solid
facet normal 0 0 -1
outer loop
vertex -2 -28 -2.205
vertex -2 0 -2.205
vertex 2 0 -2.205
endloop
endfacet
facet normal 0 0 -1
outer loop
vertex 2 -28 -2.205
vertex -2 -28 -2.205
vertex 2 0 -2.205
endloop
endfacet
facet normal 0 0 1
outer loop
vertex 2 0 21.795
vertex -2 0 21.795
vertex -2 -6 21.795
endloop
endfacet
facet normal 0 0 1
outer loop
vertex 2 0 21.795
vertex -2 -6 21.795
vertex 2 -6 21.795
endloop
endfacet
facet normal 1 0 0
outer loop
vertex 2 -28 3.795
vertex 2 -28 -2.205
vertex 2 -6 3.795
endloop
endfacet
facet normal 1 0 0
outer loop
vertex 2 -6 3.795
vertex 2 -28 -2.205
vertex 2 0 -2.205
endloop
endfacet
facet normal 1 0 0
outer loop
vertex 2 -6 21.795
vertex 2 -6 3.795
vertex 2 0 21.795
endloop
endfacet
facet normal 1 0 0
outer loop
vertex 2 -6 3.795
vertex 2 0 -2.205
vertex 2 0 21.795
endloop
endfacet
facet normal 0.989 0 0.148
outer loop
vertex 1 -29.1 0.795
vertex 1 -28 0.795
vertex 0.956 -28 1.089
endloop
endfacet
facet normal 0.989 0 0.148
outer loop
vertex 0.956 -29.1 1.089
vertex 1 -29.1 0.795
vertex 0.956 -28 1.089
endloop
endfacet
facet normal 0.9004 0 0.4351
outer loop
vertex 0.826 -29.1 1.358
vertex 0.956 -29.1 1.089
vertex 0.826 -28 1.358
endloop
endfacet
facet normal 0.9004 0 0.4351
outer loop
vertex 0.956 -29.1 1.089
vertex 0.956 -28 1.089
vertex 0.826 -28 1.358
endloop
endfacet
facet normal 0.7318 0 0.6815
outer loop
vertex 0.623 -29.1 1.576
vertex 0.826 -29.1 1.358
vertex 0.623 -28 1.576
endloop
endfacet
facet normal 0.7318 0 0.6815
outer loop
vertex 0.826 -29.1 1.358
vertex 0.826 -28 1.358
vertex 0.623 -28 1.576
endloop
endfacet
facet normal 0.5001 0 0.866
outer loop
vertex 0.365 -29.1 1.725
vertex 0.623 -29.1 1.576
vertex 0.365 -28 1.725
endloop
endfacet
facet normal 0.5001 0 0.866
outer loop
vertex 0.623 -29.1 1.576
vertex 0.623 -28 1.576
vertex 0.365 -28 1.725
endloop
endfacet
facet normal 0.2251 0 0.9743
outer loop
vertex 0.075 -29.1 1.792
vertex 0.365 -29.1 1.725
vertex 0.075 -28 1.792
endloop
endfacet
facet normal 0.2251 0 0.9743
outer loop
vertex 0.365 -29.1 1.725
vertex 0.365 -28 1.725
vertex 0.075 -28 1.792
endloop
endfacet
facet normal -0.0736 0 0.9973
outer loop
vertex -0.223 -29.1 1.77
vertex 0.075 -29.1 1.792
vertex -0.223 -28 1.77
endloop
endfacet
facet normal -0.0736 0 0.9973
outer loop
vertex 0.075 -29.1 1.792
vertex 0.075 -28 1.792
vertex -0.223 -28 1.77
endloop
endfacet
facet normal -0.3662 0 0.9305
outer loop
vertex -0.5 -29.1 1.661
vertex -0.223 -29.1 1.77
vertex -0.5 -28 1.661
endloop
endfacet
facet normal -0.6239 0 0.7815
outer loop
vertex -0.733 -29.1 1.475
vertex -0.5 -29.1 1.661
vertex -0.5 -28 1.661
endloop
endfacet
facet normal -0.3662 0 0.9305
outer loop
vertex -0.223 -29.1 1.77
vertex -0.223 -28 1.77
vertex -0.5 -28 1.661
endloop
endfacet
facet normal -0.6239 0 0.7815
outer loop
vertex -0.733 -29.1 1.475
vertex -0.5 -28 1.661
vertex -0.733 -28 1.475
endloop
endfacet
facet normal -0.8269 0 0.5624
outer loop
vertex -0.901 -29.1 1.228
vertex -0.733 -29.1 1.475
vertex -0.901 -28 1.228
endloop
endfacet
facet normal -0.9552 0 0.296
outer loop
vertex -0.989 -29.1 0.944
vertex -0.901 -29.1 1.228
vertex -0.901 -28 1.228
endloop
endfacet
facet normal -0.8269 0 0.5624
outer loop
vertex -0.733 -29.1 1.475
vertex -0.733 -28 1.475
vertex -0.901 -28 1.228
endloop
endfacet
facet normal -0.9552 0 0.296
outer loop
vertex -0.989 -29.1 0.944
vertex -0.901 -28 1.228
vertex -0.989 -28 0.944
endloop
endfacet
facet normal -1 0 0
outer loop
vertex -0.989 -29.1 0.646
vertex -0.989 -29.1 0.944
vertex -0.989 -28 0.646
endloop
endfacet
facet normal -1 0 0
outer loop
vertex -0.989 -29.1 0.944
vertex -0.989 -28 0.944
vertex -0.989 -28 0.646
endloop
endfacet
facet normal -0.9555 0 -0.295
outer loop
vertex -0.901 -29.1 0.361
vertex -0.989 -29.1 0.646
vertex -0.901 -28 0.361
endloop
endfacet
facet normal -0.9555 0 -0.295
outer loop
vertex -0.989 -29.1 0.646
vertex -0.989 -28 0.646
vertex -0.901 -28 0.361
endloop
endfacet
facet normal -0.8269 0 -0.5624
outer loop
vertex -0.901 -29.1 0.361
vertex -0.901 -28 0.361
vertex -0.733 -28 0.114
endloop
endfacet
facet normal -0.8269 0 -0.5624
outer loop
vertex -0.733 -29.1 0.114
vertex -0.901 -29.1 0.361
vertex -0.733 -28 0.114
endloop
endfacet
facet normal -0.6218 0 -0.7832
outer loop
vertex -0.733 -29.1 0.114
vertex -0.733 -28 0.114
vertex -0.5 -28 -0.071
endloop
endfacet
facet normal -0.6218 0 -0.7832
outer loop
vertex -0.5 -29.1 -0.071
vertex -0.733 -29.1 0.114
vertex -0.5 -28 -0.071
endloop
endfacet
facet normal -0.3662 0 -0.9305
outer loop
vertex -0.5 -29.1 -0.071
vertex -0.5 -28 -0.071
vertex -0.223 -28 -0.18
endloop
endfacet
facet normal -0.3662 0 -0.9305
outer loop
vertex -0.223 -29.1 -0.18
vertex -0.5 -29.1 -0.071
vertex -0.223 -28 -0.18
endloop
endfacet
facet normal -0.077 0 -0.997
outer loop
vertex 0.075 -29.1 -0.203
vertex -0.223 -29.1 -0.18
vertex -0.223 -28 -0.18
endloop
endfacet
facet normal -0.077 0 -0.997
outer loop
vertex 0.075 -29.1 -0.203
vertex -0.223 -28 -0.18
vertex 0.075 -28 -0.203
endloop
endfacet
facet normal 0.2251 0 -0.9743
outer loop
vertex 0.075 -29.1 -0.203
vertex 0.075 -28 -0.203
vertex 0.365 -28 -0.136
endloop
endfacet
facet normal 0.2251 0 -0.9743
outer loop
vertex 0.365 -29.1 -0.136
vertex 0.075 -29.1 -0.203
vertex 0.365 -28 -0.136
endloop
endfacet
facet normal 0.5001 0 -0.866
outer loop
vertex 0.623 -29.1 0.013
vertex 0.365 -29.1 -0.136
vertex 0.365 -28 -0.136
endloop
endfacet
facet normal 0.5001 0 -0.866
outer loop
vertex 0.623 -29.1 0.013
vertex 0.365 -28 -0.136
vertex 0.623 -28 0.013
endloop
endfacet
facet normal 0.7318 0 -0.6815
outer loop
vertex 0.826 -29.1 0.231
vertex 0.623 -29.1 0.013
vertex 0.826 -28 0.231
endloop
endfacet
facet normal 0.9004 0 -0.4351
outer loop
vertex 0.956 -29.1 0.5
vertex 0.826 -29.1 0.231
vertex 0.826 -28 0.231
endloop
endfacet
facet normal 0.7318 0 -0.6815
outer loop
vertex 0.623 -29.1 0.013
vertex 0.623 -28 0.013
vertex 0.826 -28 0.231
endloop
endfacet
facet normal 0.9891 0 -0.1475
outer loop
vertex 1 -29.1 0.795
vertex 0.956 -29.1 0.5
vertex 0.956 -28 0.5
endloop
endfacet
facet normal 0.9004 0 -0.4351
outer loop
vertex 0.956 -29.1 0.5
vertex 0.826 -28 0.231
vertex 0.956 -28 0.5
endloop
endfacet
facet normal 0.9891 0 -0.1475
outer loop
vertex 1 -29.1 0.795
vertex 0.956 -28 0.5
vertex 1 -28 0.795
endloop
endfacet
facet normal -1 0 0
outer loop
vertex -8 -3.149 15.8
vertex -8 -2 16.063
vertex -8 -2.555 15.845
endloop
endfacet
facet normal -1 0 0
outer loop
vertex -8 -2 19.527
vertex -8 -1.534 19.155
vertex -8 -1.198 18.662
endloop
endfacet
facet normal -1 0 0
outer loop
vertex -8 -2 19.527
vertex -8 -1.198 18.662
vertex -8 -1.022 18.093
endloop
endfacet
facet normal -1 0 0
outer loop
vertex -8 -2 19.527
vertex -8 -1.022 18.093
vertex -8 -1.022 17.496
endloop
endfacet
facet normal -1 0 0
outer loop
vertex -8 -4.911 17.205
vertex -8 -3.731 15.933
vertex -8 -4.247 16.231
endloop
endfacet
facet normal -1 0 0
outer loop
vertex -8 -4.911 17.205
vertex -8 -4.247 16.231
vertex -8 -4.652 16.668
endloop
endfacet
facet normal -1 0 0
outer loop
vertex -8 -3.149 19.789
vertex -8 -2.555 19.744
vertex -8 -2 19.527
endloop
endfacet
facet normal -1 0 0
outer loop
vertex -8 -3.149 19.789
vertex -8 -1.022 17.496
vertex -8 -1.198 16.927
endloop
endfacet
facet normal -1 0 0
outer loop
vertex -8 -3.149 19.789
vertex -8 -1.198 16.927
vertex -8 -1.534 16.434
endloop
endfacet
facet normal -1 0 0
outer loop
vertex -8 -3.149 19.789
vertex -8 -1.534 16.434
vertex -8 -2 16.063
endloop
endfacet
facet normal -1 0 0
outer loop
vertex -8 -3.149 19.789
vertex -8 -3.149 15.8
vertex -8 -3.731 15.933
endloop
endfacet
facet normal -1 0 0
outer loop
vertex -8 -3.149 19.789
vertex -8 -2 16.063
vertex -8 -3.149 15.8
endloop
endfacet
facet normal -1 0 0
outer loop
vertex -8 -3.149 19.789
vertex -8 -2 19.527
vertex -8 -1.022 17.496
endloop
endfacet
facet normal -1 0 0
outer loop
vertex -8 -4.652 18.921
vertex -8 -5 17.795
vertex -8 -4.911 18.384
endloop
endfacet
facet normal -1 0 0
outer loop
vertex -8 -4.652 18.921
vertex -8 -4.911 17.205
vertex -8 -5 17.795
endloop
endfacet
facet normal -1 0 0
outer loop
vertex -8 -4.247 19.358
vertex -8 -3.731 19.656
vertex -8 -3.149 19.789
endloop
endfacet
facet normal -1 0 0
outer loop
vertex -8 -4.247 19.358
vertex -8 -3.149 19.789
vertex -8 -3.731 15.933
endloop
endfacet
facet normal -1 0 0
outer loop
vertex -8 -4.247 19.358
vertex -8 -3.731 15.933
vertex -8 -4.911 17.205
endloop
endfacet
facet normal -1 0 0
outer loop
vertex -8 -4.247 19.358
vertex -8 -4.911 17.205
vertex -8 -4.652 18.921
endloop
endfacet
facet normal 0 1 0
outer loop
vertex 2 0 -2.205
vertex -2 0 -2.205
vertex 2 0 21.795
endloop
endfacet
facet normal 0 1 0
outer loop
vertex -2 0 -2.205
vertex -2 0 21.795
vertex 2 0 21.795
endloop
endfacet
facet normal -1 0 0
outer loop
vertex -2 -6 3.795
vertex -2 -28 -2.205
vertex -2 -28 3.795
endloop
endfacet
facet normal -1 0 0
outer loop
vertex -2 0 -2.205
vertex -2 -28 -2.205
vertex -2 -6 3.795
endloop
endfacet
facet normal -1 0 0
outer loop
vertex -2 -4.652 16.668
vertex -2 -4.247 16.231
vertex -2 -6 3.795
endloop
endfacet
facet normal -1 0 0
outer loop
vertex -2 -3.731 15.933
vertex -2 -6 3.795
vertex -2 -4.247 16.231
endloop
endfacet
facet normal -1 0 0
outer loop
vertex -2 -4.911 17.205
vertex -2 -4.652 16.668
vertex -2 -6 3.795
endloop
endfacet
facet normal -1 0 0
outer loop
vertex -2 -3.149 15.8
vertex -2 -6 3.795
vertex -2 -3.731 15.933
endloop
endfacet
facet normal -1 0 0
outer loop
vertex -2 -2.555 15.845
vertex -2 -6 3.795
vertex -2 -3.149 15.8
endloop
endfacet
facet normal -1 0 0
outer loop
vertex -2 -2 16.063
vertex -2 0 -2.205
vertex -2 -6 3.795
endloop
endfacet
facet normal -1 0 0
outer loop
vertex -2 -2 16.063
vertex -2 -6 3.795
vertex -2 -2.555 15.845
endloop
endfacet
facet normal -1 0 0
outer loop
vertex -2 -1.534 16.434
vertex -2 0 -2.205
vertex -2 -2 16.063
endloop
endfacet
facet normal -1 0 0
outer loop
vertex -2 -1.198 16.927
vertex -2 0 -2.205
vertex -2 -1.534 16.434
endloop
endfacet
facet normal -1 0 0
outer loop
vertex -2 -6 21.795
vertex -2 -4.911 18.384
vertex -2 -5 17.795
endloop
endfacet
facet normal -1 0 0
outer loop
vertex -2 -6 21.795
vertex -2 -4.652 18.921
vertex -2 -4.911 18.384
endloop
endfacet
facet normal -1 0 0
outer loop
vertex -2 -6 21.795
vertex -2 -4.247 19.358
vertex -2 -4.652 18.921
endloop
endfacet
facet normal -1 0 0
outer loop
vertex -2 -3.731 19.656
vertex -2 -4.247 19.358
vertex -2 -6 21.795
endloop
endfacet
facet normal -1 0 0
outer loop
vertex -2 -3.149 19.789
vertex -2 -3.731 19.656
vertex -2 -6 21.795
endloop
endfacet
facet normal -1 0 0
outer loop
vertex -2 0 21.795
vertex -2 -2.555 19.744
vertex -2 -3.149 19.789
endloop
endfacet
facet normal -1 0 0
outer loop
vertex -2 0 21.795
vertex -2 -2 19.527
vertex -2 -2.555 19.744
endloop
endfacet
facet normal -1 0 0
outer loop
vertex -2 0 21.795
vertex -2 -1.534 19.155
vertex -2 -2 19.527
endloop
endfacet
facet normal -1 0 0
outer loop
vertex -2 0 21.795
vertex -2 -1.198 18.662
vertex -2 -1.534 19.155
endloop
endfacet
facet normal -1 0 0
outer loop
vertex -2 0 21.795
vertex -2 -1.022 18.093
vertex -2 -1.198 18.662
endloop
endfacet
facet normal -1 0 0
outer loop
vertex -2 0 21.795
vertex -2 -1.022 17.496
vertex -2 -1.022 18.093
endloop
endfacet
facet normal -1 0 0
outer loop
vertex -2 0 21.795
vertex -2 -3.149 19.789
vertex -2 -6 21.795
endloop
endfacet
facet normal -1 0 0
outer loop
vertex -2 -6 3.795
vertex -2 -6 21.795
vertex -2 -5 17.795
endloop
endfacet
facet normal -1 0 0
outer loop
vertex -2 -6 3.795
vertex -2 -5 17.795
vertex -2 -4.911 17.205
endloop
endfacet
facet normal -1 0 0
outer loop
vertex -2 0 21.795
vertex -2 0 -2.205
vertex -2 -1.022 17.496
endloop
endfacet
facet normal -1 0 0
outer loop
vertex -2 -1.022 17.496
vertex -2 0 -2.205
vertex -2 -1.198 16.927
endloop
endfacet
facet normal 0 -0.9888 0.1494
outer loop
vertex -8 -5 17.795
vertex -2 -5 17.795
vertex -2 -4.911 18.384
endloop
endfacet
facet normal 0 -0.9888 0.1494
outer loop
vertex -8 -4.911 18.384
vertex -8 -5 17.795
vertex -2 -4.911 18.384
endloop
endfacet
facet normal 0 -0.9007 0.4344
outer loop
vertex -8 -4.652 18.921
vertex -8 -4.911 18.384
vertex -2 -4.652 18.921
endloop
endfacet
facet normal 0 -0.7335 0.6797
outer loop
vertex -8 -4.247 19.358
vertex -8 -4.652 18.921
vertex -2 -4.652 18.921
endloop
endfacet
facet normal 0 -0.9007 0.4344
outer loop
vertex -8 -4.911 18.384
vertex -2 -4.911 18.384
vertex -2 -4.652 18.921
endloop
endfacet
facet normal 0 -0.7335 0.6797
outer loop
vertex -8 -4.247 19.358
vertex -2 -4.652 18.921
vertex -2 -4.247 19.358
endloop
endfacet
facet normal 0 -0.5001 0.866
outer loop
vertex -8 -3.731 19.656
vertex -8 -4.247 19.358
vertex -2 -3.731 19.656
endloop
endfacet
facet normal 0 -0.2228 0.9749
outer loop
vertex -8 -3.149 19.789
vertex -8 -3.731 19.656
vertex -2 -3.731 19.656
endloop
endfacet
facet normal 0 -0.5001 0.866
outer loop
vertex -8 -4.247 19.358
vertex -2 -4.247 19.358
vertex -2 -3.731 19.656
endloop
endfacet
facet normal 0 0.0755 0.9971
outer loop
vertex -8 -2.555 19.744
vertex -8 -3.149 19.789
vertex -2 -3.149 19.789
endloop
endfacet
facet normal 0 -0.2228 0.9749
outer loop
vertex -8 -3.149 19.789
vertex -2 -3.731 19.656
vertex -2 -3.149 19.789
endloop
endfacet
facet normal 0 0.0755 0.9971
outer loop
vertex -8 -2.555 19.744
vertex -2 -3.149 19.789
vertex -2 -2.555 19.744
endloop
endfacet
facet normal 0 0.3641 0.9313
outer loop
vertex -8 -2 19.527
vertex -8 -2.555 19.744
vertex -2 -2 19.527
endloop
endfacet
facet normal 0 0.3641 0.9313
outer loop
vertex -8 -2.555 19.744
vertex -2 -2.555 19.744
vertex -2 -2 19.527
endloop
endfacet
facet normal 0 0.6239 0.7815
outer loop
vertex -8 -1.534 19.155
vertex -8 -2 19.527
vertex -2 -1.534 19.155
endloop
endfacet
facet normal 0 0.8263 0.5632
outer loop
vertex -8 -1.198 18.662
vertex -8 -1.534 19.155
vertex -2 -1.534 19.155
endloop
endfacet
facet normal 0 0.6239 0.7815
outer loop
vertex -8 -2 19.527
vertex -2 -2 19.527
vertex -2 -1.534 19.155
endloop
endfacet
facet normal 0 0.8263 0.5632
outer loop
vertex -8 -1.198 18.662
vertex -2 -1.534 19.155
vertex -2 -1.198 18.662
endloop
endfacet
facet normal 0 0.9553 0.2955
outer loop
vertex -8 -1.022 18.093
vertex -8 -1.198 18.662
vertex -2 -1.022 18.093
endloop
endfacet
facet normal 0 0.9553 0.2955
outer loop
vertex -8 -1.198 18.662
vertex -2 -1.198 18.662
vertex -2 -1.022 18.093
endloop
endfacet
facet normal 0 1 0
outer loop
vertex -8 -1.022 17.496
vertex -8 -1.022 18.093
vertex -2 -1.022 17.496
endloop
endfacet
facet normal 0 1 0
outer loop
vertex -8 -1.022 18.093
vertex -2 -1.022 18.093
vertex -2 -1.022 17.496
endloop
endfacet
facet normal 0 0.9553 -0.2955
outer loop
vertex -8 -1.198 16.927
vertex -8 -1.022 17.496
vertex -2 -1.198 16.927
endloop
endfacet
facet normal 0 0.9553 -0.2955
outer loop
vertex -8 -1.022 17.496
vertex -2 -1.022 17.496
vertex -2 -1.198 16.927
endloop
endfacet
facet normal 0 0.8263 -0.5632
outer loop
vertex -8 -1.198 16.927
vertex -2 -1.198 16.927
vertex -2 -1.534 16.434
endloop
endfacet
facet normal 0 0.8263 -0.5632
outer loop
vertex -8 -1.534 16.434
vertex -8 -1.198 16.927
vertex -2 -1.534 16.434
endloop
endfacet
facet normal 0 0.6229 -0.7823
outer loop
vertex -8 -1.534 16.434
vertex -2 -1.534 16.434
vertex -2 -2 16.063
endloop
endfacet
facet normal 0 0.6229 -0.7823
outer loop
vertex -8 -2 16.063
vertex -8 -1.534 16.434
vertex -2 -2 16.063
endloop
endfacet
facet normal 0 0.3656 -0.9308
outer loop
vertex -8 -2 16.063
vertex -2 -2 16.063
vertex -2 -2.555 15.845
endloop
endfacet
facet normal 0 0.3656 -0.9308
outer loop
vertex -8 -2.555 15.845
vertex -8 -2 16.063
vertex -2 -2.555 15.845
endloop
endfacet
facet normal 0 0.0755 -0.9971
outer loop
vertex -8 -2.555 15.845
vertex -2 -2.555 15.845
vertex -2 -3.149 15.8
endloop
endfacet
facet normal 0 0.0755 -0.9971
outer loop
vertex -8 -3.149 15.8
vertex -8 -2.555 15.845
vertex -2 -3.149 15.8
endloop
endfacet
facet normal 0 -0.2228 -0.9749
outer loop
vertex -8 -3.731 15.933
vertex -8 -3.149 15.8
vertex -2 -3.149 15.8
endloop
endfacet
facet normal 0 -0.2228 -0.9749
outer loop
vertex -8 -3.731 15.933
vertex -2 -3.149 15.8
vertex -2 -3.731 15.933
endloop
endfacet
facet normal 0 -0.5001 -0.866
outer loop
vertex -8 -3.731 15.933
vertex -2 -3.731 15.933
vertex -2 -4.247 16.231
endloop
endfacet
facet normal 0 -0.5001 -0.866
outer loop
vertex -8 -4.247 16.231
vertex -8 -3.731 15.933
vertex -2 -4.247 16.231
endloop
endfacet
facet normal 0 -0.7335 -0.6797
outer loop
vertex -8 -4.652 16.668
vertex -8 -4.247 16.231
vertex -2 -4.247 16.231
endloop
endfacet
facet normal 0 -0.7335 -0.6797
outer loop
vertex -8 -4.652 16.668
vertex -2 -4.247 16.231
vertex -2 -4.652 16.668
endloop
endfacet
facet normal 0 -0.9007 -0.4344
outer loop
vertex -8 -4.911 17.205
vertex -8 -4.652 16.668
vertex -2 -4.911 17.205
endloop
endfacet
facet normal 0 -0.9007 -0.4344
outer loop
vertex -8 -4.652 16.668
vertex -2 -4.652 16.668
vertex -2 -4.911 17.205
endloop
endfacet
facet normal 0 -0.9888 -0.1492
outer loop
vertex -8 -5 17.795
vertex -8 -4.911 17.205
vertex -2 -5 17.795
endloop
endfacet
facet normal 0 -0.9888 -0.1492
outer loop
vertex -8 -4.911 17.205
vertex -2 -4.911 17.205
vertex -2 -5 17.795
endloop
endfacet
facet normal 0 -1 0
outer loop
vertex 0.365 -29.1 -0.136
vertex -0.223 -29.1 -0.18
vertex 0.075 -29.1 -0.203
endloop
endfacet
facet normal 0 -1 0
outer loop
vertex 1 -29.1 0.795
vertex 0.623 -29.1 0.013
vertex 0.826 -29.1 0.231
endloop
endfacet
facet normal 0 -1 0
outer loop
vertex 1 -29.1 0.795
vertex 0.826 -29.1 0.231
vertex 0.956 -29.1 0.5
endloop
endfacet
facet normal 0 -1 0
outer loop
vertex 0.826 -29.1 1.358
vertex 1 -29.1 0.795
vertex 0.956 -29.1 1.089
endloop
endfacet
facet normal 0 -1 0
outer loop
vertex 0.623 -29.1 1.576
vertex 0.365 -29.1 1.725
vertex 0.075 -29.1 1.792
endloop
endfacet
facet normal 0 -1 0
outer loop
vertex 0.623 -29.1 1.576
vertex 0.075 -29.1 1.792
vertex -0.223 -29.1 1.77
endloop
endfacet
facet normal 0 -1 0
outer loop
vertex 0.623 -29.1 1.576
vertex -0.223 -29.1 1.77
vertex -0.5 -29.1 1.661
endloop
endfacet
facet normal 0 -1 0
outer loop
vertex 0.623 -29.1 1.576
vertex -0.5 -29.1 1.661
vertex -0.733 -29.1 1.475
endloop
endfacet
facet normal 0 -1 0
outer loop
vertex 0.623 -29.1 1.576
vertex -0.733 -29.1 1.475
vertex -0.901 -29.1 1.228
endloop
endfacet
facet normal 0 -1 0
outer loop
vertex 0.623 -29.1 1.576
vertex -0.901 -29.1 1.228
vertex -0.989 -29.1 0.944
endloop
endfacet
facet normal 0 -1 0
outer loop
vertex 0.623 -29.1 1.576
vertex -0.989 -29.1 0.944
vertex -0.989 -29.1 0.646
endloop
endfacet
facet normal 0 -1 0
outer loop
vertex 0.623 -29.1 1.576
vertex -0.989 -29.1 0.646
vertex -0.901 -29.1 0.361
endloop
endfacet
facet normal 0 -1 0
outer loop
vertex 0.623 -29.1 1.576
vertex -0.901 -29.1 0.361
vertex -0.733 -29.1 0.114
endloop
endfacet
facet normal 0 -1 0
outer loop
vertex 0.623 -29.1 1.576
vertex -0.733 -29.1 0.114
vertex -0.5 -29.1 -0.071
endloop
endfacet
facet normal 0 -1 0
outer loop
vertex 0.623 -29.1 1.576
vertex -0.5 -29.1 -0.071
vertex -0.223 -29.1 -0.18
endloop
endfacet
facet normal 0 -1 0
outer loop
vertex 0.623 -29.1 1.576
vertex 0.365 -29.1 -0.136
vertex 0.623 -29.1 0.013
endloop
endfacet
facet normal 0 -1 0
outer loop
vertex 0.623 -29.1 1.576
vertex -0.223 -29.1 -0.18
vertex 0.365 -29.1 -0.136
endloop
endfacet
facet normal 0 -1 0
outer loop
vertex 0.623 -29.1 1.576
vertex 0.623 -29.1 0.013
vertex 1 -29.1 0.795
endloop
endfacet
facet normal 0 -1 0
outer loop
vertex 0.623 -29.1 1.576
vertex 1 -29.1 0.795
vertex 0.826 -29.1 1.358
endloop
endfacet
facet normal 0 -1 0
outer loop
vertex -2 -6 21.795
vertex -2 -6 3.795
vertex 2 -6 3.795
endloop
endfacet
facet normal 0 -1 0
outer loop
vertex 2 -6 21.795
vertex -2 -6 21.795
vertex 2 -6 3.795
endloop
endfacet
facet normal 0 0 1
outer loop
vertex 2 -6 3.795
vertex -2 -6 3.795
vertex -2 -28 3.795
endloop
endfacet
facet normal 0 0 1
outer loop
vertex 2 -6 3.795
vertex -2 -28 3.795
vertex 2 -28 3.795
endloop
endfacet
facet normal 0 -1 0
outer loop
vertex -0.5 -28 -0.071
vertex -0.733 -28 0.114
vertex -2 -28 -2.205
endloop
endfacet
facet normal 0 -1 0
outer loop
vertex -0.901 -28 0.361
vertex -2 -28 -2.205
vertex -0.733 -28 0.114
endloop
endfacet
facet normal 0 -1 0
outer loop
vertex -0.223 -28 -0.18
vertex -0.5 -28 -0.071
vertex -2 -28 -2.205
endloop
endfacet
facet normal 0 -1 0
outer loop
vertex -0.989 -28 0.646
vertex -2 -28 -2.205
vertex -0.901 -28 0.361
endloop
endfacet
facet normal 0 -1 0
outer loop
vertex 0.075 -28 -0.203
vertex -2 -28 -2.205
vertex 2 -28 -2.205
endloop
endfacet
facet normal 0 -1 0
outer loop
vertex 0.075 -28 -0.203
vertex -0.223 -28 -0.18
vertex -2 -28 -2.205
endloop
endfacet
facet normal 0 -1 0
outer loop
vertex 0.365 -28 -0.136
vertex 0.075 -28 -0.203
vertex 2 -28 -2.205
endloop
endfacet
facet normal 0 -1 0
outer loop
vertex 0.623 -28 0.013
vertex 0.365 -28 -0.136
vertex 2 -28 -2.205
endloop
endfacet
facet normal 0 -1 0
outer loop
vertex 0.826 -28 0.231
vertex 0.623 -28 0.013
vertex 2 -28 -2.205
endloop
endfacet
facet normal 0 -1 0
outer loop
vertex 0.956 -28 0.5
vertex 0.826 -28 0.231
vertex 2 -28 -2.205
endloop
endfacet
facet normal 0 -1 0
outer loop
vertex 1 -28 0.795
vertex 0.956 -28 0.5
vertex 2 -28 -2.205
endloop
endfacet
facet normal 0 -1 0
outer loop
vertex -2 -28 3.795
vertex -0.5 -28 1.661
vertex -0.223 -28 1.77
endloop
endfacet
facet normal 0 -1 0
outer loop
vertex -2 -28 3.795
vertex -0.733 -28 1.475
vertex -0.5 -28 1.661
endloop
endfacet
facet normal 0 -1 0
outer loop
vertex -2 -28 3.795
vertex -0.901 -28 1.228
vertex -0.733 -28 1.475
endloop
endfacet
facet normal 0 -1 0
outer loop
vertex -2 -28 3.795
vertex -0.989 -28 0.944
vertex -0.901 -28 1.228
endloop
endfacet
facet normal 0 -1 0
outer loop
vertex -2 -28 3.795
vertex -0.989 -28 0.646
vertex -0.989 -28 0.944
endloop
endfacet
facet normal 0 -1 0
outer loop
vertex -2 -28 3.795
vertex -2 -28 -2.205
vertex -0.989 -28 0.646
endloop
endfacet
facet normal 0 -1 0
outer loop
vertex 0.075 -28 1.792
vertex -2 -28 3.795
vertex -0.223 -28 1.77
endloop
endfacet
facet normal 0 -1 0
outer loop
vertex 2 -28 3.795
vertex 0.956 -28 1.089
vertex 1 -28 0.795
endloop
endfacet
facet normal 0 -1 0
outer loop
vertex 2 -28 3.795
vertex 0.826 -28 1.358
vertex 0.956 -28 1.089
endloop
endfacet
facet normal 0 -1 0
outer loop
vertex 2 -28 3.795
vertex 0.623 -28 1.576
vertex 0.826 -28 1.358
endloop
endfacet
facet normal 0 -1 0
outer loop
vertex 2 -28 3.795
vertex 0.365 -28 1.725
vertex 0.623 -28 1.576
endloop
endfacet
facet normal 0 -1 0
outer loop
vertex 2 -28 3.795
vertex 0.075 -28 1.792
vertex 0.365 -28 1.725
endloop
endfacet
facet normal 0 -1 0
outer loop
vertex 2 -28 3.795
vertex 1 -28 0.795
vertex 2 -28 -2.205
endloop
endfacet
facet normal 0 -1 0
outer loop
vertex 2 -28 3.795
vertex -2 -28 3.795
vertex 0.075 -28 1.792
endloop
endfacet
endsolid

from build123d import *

# Parameters (mm, degrees)
F0_W     = 4
F0_H     = 18
F1_DEPTH = 6
F0_H_2   = 6
F2_DEPTH = 28
F3_R     = 1
F4_DEPTH = 1.1
F5_R     = 2
F6_DEPTH = 6


with BuildPart() as f1:
    # F0 (on Front) → F1 (new body)
    with BuildSketch(Plane.XZ):
        with Locations((0, 12.794577)):
            Rectangle(F0_W, F0_H)
    extrude(amount=F1_DEPTH)

    # F0 (on Front) → F2 (join)
    with BuildSketch(Plane.XZ):
        with Locations((0, 0.794577)):
            Rectangle(F0_W, F0_H_2)
    extrude(amount=F2_DEPTH)

    # F3 (on face) → F4 (join)
    with BuildSketch(Plane.XZ.offset(28)):
        with Locations((0, 0.794577)):
            Circle(F3_R)
    extrude(amount=F4_DEPTH)

    # F5 (on face) → F6 (join)
    with BuildSketch(Plane(origin=(-2, 0, 0), x_dir=(0, -1, 0), z_dir=(-1, 0, 0))):
        with Locations((3, 17.794577)):
            Circle(F5_R)
    extrude(amount=F6_DEPTH)


solid = f1.part
